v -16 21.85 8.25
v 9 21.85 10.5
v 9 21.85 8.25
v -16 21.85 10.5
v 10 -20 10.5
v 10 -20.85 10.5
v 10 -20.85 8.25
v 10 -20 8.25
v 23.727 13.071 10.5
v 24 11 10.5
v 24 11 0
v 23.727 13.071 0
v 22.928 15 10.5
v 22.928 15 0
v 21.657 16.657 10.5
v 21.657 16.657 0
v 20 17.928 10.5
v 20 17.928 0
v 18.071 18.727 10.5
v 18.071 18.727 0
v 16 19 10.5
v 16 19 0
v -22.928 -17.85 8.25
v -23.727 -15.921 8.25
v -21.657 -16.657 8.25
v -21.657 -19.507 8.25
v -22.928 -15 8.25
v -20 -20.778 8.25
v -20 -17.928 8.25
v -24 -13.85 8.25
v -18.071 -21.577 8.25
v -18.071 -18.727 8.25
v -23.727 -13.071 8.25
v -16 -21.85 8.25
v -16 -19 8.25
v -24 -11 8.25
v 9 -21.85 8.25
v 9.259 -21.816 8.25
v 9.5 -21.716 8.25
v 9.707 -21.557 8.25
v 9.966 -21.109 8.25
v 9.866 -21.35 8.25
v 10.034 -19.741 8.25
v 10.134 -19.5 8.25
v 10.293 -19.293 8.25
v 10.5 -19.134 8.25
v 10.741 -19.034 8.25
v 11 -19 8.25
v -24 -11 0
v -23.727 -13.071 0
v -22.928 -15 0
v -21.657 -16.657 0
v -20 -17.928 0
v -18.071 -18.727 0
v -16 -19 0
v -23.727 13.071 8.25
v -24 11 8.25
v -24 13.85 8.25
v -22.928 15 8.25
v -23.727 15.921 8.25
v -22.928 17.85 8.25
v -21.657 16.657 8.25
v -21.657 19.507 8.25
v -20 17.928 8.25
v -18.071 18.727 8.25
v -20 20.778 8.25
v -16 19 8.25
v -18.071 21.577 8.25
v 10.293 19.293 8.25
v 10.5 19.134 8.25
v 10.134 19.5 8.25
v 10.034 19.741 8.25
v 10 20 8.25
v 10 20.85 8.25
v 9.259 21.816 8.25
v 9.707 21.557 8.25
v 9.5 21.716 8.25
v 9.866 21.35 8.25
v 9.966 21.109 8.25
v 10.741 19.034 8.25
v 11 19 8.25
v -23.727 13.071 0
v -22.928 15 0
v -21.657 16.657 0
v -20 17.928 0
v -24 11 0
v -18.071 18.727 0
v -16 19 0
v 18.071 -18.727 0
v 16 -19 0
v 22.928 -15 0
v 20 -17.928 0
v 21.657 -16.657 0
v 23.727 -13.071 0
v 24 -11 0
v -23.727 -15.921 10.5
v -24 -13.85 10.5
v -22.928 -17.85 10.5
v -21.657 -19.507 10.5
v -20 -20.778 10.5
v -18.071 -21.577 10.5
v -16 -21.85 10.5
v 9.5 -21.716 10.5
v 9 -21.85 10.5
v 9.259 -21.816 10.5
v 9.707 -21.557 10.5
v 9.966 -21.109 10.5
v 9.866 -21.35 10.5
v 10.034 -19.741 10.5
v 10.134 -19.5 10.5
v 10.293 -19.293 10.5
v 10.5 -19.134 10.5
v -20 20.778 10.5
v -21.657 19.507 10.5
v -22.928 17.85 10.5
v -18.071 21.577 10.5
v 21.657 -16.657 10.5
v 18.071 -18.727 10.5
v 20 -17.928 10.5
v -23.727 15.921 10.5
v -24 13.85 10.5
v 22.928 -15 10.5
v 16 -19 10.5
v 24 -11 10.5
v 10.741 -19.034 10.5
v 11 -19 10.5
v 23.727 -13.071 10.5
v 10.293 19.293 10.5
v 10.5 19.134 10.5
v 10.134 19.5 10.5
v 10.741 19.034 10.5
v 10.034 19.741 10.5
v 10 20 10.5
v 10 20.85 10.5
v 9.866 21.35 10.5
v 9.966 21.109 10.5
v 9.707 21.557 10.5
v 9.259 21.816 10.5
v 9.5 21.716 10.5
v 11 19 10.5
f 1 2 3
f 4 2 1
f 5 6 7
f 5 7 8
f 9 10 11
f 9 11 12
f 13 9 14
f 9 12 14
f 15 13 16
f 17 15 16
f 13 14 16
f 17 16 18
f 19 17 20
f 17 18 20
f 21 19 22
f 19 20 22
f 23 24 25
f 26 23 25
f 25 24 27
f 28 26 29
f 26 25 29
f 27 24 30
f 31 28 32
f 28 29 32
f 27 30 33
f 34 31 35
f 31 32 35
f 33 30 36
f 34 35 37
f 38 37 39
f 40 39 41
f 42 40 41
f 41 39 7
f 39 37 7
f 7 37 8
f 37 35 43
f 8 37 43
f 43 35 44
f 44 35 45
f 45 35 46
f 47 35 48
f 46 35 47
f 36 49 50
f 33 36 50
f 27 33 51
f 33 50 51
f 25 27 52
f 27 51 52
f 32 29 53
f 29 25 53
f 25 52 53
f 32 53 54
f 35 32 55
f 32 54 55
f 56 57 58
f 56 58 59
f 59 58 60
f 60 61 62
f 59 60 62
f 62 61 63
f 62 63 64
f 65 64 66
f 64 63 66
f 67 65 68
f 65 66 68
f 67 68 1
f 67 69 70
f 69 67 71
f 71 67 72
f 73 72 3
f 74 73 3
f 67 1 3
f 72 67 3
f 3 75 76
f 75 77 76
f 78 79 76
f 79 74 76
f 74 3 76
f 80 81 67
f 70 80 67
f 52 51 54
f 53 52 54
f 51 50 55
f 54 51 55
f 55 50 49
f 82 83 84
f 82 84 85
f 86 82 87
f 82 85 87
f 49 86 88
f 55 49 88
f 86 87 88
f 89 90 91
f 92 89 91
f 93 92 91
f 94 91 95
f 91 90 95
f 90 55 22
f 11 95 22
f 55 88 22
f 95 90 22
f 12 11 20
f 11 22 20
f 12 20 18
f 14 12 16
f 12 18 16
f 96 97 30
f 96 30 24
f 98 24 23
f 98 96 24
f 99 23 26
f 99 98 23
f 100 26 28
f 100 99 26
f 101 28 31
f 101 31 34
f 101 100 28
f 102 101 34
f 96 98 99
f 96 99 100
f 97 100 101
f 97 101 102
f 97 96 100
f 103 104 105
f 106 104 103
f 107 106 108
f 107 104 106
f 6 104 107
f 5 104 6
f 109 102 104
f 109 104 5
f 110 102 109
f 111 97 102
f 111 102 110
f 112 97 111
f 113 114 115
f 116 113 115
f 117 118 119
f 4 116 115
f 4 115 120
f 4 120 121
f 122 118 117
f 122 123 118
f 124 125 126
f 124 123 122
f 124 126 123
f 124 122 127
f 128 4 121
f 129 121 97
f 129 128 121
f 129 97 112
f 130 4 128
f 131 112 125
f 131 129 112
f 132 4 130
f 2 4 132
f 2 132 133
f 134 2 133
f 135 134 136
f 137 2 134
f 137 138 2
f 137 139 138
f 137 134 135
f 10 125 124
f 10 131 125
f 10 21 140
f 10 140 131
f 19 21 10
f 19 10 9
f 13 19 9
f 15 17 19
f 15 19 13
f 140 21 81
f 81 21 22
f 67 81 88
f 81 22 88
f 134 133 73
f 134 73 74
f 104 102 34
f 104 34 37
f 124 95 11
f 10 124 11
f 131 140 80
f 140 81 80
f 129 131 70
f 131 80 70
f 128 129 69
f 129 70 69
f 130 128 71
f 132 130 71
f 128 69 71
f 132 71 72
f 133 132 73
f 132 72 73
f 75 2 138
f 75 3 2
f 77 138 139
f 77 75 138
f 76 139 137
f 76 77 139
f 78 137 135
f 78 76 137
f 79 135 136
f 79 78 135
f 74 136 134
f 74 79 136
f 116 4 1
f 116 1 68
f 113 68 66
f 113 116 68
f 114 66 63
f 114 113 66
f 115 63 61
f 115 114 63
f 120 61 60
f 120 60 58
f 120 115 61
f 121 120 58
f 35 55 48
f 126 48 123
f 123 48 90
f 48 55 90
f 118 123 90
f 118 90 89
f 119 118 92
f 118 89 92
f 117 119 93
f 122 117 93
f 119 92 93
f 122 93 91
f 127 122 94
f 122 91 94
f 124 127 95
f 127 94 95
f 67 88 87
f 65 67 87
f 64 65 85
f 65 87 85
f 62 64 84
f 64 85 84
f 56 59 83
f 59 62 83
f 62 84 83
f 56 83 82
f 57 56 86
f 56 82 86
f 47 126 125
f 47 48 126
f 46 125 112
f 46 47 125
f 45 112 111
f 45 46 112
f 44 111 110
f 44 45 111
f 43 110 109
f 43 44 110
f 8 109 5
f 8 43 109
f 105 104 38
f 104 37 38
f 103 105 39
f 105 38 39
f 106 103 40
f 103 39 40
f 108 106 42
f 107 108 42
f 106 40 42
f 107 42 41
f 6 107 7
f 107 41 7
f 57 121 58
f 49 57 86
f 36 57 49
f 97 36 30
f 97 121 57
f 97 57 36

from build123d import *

# Parameters (mm, degrees)
F1_DEPTH = 10.5
F3_DEPTH = 2.25
F4_R     = 1


with BuildPart() as f1:
    # F0 (on Top) → F1 (new body)
    with BuildSketch(Plane.XY):
        with BuildLine():
            Line((16, 19), (-16, 19))
            ThreePointArc((-16, 19), (-21.6568542495, 16.6568542495), (-24, 11))
            Line((-24, 11), (-24, -11))
            ThreePointArc((-24, -11), (-21.6568542495, -16.6568542495), (-16, -19))
            Line((-16, -19), (16, -19))
            ThreePointArc((16, -19), (21.6568542495, -16.6568542495), (24, -11))
            Line((24, -11), (24, 11))
            ThreePointArc((24, 11), (21.6568542495, 16.6568542495), (16, 19))
        make_face()
    extrude(amount=F1_DEPTH)

    # F2 (on face) → F3 (join)
    with BuildSketch(Plane.XY.offset(10.5)):
        with BuildLine():
            Line((10, 21.85), (-16, 21.85))
            ThreePointArc((-16, 21.85), (-21.6568542495, 19.5068542495), (-24, 13.85))
            Line((-24, 13.85), (-24, 11))
            ThreePointArc((-24, 11), (-21.6568542495, 16.6568542495), (-16, 19))
            Line((-16, 19), (10, 19))
            Line((10, 19), (10, 21.85))
        make_face()
        with BuildLine():
            Line((10, -21.85), (10, -19))
            Line((10, -19), (-16, -19))
            ThreePointArc((-16, -19), (-21.6568542495, -16.6568542495), (-24, -11))
            Line((-24, -11), (-24, -13.85))
            ThreePointArc((-24, -13.85), (-21.6568542495, -19.5068542495), (-16, -21.85))
            Line((-16, -21.85), (10, -21.85))
        make_face()
    extrude(amount=-F3_DEPTH)

    # F4
    f4_edges = [f1.edges().sort_by_distance(p)[0] for p in [
        (10, -19, 9.375),
        (10, -21.85, 9.375),
        (10, 21.85, 9.375),
        (10, 19, 9.375),
    ]]
    fillet(f4_edges, radius=F4_R)


solid = f1.part
